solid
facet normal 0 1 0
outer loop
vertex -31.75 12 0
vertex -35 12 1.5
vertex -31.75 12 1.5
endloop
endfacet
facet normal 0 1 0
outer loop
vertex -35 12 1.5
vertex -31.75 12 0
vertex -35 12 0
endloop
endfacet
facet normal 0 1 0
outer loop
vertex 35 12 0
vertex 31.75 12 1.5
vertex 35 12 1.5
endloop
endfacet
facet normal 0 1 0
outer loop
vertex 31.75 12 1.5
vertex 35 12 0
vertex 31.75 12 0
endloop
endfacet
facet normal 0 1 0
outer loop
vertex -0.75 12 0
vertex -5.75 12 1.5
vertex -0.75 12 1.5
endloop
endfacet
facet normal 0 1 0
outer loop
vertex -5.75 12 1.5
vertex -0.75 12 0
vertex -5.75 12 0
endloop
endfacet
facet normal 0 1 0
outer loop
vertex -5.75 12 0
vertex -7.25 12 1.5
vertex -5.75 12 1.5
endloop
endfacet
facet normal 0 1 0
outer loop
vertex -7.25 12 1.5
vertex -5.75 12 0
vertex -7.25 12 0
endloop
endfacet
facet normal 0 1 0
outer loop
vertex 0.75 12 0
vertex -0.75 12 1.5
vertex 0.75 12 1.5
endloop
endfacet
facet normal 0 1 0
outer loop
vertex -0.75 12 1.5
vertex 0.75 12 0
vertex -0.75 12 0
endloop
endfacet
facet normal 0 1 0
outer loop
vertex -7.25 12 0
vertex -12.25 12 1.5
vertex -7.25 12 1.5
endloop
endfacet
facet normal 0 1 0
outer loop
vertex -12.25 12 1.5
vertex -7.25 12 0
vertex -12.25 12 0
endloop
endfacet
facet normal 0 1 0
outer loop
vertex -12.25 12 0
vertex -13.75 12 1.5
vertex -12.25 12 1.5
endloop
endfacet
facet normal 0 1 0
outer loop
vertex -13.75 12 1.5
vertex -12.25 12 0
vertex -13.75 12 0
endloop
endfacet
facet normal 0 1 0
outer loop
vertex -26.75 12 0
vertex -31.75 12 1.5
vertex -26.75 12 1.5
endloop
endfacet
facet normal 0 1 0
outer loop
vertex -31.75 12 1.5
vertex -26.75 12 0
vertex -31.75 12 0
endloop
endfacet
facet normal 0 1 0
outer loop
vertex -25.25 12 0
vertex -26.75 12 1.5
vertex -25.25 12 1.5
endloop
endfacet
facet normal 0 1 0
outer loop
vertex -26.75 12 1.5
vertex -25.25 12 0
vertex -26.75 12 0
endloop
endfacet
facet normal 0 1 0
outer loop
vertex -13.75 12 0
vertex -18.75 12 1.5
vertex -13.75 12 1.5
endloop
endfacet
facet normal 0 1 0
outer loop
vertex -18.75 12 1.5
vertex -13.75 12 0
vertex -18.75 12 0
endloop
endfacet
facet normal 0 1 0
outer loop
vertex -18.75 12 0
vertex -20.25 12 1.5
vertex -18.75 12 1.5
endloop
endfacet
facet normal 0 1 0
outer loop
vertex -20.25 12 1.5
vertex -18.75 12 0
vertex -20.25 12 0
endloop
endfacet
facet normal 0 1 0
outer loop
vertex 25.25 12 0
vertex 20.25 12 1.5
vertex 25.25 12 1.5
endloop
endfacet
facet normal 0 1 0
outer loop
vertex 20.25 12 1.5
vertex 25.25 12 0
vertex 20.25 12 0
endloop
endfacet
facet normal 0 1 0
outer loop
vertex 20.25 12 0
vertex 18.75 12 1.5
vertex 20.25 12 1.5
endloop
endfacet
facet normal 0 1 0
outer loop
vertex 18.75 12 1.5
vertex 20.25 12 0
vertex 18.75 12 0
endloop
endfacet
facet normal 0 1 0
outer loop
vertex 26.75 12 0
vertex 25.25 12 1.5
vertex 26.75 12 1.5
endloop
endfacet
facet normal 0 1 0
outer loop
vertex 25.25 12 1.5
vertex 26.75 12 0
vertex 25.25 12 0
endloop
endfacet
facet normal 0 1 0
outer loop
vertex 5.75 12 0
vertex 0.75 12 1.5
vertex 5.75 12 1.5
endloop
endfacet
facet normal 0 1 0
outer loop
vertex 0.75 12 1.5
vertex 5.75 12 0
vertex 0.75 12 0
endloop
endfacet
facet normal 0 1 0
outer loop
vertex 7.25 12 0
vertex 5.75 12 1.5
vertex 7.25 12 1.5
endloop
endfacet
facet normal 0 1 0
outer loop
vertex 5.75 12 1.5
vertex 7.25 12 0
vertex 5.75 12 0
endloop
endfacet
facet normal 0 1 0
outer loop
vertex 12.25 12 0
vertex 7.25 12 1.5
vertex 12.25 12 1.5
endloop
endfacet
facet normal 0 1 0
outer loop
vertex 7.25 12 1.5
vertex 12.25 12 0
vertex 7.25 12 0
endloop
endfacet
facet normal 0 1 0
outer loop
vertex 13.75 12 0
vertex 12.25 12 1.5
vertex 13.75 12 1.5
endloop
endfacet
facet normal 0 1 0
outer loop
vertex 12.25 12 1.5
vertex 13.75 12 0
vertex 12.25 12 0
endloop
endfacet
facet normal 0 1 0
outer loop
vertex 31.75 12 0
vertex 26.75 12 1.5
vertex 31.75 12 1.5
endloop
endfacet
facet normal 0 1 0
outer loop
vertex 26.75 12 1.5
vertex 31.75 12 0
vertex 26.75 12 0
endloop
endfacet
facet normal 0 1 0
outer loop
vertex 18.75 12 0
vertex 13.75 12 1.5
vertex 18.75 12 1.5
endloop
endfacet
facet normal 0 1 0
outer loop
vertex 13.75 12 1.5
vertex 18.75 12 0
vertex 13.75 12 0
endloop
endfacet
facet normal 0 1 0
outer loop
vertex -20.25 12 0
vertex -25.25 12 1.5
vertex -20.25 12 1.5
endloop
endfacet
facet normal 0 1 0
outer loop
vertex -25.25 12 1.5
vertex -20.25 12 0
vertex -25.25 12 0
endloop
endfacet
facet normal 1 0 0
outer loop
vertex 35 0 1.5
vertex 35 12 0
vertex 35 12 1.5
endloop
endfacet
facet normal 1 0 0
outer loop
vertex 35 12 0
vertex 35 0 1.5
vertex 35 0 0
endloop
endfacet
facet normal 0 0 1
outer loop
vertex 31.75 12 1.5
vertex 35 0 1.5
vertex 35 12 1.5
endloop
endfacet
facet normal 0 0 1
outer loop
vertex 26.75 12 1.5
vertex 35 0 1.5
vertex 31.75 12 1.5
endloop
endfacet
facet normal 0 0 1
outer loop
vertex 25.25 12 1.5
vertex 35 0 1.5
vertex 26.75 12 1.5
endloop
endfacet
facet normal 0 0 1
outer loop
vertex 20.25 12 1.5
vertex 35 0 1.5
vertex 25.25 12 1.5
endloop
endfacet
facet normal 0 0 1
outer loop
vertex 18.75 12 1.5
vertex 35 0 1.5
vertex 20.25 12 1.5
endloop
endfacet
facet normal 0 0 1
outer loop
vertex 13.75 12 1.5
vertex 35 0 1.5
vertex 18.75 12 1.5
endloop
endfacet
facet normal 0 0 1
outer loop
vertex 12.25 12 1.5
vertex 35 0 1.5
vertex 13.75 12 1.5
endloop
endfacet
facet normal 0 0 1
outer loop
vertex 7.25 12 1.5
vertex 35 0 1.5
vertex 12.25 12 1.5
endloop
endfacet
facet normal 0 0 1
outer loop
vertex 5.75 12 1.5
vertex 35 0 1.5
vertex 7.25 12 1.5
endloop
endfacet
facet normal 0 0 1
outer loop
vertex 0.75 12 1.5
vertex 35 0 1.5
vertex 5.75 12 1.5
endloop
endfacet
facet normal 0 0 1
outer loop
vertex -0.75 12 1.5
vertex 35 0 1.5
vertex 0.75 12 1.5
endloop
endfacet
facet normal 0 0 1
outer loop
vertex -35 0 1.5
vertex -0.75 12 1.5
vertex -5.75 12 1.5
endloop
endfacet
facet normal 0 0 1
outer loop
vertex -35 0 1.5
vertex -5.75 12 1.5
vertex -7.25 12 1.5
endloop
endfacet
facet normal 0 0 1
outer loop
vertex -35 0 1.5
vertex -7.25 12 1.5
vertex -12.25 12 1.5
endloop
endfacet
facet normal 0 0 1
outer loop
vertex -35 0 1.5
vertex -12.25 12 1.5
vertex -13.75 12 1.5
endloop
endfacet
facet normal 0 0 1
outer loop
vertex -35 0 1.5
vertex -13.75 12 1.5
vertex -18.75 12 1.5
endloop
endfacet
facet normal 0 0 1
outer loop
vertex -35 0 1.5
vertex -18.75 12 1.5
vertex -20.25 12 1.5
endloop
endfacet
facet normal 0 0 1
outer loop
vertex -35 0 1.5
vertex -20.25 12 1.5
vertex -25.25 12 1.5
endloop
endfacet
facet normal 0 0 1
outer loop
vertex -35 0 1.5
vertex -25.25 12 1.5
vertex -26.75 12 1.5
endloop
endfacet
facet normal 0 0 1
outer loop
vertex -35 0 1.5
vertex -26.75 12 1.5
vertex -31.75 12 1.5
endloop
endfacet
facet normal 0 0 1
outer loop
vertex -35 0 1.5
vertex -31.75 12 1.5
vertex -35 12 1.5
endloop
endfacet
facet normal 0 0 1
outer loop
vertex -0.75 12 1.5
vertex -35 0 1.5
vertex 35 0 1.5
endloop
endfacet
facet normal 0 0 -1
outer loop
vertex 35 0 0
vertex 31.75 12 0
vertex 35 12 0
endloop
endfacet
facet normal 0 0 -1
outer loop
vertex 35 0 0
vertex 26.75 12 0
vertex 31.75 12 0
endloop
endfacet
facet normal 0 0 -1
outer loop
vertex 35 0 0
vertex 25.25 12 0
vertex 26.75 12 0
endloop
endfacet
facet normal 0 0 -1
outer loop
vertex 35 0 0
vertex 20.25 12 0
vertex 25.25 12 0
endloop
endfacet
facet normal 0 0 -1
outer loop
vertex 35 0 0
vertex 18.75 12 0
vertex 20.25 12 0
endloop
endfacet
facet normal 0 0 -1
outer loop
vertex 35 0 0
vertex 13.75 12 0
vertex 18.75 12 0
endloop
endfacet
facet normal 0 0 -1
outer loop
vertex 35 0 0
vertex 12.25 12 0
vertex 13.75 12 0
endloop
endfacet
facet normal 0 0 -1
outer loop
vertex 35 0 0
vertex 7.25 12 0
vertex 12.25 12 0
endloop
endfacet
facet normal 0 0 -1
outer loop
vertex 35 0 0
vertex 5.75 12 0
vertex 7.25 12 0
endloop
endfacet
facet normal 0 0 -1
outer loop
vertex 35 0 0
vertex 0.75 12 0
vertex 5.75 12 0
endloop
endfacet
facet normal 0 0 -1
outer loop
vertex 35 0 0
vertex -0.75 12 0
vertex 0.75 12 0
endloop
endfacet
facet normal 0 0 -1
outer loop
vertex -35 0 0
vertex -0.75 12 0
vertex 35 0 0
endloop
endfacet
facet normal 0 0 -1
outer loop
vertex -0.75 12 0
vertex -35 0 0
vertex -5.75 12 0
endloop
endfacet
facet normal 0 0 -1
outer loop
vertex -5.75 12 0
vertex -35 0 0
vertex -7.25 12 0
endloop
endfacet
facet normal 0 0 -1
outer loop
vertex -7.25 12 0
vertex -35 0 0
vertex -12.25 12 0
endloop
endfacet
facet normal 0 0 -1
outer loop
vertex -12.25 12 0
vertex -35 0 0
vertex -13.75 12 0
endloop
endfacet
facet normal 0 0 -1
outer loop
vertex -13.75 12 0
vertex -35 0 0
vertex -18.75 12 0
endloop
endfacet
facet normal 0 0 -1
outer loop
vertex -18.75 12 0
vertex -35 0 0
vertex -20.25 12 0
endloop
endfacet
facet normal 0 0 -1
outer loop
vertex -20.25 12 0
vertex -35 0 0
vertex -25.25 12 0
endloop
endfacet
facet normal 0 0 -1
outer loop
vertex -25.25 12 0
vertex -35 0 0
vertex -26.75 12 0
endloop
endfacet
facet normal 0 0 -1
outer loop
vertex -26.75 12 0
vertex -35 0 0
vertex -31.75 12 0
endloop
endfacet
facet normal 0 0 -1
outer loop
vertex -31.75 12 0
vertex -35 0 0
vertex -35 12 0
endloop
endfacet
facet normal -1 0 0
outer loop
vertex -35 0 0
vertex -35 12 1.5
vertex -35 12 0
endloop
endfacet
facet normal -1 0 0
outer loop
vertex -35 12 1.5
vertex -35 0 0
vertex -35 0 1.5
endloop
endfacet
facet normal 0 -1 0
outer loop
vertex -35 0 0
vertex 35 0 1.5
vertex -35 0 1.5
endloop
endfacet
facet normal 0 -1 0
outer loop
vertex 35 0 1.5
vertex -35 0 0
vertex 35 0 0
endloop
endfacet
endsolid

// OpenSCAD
// 10-well comb for agarose gel casting
// Printed lying flat on the bed

// ---------- Dimensions ----------
plate_t      = 1.5;    // plate thickness (Z)
spine_len    = 70;     // spine length along X
spine_wid    = 12;     // spine width along Y
tooth_w      = 5.0;    // tooth width along X
tooth_len    = 12;     // tooth length along Y
gap          = 1.5;    // gap between neighbouring teeth along X
n_teeth      = 10;     // number of teeth
eps          = 0.5;    // cutter overshoot past faces

$fn = 64;

// ---------- Derived ----------
pitch   = tooth_w + gap;
x0      = -(n_teeth * tooth_w + (n_teeth - 1) * gap) / 2;   // first tooth X

// ---------- Model ----------
difference() {
    // Spine (back bar)
    translate([-spine_len / 2, 0, 0])
        cube([spine_len, spine_wid, plate_t]);

    // Teeth (hang from -Y edge of spine)
    for (i = [0 : n_teeth - 1])
        translate([x0 + i * pitch, tooth_len, 0])
            cube([tooth_w, tooth_len, plate_t]);
}
